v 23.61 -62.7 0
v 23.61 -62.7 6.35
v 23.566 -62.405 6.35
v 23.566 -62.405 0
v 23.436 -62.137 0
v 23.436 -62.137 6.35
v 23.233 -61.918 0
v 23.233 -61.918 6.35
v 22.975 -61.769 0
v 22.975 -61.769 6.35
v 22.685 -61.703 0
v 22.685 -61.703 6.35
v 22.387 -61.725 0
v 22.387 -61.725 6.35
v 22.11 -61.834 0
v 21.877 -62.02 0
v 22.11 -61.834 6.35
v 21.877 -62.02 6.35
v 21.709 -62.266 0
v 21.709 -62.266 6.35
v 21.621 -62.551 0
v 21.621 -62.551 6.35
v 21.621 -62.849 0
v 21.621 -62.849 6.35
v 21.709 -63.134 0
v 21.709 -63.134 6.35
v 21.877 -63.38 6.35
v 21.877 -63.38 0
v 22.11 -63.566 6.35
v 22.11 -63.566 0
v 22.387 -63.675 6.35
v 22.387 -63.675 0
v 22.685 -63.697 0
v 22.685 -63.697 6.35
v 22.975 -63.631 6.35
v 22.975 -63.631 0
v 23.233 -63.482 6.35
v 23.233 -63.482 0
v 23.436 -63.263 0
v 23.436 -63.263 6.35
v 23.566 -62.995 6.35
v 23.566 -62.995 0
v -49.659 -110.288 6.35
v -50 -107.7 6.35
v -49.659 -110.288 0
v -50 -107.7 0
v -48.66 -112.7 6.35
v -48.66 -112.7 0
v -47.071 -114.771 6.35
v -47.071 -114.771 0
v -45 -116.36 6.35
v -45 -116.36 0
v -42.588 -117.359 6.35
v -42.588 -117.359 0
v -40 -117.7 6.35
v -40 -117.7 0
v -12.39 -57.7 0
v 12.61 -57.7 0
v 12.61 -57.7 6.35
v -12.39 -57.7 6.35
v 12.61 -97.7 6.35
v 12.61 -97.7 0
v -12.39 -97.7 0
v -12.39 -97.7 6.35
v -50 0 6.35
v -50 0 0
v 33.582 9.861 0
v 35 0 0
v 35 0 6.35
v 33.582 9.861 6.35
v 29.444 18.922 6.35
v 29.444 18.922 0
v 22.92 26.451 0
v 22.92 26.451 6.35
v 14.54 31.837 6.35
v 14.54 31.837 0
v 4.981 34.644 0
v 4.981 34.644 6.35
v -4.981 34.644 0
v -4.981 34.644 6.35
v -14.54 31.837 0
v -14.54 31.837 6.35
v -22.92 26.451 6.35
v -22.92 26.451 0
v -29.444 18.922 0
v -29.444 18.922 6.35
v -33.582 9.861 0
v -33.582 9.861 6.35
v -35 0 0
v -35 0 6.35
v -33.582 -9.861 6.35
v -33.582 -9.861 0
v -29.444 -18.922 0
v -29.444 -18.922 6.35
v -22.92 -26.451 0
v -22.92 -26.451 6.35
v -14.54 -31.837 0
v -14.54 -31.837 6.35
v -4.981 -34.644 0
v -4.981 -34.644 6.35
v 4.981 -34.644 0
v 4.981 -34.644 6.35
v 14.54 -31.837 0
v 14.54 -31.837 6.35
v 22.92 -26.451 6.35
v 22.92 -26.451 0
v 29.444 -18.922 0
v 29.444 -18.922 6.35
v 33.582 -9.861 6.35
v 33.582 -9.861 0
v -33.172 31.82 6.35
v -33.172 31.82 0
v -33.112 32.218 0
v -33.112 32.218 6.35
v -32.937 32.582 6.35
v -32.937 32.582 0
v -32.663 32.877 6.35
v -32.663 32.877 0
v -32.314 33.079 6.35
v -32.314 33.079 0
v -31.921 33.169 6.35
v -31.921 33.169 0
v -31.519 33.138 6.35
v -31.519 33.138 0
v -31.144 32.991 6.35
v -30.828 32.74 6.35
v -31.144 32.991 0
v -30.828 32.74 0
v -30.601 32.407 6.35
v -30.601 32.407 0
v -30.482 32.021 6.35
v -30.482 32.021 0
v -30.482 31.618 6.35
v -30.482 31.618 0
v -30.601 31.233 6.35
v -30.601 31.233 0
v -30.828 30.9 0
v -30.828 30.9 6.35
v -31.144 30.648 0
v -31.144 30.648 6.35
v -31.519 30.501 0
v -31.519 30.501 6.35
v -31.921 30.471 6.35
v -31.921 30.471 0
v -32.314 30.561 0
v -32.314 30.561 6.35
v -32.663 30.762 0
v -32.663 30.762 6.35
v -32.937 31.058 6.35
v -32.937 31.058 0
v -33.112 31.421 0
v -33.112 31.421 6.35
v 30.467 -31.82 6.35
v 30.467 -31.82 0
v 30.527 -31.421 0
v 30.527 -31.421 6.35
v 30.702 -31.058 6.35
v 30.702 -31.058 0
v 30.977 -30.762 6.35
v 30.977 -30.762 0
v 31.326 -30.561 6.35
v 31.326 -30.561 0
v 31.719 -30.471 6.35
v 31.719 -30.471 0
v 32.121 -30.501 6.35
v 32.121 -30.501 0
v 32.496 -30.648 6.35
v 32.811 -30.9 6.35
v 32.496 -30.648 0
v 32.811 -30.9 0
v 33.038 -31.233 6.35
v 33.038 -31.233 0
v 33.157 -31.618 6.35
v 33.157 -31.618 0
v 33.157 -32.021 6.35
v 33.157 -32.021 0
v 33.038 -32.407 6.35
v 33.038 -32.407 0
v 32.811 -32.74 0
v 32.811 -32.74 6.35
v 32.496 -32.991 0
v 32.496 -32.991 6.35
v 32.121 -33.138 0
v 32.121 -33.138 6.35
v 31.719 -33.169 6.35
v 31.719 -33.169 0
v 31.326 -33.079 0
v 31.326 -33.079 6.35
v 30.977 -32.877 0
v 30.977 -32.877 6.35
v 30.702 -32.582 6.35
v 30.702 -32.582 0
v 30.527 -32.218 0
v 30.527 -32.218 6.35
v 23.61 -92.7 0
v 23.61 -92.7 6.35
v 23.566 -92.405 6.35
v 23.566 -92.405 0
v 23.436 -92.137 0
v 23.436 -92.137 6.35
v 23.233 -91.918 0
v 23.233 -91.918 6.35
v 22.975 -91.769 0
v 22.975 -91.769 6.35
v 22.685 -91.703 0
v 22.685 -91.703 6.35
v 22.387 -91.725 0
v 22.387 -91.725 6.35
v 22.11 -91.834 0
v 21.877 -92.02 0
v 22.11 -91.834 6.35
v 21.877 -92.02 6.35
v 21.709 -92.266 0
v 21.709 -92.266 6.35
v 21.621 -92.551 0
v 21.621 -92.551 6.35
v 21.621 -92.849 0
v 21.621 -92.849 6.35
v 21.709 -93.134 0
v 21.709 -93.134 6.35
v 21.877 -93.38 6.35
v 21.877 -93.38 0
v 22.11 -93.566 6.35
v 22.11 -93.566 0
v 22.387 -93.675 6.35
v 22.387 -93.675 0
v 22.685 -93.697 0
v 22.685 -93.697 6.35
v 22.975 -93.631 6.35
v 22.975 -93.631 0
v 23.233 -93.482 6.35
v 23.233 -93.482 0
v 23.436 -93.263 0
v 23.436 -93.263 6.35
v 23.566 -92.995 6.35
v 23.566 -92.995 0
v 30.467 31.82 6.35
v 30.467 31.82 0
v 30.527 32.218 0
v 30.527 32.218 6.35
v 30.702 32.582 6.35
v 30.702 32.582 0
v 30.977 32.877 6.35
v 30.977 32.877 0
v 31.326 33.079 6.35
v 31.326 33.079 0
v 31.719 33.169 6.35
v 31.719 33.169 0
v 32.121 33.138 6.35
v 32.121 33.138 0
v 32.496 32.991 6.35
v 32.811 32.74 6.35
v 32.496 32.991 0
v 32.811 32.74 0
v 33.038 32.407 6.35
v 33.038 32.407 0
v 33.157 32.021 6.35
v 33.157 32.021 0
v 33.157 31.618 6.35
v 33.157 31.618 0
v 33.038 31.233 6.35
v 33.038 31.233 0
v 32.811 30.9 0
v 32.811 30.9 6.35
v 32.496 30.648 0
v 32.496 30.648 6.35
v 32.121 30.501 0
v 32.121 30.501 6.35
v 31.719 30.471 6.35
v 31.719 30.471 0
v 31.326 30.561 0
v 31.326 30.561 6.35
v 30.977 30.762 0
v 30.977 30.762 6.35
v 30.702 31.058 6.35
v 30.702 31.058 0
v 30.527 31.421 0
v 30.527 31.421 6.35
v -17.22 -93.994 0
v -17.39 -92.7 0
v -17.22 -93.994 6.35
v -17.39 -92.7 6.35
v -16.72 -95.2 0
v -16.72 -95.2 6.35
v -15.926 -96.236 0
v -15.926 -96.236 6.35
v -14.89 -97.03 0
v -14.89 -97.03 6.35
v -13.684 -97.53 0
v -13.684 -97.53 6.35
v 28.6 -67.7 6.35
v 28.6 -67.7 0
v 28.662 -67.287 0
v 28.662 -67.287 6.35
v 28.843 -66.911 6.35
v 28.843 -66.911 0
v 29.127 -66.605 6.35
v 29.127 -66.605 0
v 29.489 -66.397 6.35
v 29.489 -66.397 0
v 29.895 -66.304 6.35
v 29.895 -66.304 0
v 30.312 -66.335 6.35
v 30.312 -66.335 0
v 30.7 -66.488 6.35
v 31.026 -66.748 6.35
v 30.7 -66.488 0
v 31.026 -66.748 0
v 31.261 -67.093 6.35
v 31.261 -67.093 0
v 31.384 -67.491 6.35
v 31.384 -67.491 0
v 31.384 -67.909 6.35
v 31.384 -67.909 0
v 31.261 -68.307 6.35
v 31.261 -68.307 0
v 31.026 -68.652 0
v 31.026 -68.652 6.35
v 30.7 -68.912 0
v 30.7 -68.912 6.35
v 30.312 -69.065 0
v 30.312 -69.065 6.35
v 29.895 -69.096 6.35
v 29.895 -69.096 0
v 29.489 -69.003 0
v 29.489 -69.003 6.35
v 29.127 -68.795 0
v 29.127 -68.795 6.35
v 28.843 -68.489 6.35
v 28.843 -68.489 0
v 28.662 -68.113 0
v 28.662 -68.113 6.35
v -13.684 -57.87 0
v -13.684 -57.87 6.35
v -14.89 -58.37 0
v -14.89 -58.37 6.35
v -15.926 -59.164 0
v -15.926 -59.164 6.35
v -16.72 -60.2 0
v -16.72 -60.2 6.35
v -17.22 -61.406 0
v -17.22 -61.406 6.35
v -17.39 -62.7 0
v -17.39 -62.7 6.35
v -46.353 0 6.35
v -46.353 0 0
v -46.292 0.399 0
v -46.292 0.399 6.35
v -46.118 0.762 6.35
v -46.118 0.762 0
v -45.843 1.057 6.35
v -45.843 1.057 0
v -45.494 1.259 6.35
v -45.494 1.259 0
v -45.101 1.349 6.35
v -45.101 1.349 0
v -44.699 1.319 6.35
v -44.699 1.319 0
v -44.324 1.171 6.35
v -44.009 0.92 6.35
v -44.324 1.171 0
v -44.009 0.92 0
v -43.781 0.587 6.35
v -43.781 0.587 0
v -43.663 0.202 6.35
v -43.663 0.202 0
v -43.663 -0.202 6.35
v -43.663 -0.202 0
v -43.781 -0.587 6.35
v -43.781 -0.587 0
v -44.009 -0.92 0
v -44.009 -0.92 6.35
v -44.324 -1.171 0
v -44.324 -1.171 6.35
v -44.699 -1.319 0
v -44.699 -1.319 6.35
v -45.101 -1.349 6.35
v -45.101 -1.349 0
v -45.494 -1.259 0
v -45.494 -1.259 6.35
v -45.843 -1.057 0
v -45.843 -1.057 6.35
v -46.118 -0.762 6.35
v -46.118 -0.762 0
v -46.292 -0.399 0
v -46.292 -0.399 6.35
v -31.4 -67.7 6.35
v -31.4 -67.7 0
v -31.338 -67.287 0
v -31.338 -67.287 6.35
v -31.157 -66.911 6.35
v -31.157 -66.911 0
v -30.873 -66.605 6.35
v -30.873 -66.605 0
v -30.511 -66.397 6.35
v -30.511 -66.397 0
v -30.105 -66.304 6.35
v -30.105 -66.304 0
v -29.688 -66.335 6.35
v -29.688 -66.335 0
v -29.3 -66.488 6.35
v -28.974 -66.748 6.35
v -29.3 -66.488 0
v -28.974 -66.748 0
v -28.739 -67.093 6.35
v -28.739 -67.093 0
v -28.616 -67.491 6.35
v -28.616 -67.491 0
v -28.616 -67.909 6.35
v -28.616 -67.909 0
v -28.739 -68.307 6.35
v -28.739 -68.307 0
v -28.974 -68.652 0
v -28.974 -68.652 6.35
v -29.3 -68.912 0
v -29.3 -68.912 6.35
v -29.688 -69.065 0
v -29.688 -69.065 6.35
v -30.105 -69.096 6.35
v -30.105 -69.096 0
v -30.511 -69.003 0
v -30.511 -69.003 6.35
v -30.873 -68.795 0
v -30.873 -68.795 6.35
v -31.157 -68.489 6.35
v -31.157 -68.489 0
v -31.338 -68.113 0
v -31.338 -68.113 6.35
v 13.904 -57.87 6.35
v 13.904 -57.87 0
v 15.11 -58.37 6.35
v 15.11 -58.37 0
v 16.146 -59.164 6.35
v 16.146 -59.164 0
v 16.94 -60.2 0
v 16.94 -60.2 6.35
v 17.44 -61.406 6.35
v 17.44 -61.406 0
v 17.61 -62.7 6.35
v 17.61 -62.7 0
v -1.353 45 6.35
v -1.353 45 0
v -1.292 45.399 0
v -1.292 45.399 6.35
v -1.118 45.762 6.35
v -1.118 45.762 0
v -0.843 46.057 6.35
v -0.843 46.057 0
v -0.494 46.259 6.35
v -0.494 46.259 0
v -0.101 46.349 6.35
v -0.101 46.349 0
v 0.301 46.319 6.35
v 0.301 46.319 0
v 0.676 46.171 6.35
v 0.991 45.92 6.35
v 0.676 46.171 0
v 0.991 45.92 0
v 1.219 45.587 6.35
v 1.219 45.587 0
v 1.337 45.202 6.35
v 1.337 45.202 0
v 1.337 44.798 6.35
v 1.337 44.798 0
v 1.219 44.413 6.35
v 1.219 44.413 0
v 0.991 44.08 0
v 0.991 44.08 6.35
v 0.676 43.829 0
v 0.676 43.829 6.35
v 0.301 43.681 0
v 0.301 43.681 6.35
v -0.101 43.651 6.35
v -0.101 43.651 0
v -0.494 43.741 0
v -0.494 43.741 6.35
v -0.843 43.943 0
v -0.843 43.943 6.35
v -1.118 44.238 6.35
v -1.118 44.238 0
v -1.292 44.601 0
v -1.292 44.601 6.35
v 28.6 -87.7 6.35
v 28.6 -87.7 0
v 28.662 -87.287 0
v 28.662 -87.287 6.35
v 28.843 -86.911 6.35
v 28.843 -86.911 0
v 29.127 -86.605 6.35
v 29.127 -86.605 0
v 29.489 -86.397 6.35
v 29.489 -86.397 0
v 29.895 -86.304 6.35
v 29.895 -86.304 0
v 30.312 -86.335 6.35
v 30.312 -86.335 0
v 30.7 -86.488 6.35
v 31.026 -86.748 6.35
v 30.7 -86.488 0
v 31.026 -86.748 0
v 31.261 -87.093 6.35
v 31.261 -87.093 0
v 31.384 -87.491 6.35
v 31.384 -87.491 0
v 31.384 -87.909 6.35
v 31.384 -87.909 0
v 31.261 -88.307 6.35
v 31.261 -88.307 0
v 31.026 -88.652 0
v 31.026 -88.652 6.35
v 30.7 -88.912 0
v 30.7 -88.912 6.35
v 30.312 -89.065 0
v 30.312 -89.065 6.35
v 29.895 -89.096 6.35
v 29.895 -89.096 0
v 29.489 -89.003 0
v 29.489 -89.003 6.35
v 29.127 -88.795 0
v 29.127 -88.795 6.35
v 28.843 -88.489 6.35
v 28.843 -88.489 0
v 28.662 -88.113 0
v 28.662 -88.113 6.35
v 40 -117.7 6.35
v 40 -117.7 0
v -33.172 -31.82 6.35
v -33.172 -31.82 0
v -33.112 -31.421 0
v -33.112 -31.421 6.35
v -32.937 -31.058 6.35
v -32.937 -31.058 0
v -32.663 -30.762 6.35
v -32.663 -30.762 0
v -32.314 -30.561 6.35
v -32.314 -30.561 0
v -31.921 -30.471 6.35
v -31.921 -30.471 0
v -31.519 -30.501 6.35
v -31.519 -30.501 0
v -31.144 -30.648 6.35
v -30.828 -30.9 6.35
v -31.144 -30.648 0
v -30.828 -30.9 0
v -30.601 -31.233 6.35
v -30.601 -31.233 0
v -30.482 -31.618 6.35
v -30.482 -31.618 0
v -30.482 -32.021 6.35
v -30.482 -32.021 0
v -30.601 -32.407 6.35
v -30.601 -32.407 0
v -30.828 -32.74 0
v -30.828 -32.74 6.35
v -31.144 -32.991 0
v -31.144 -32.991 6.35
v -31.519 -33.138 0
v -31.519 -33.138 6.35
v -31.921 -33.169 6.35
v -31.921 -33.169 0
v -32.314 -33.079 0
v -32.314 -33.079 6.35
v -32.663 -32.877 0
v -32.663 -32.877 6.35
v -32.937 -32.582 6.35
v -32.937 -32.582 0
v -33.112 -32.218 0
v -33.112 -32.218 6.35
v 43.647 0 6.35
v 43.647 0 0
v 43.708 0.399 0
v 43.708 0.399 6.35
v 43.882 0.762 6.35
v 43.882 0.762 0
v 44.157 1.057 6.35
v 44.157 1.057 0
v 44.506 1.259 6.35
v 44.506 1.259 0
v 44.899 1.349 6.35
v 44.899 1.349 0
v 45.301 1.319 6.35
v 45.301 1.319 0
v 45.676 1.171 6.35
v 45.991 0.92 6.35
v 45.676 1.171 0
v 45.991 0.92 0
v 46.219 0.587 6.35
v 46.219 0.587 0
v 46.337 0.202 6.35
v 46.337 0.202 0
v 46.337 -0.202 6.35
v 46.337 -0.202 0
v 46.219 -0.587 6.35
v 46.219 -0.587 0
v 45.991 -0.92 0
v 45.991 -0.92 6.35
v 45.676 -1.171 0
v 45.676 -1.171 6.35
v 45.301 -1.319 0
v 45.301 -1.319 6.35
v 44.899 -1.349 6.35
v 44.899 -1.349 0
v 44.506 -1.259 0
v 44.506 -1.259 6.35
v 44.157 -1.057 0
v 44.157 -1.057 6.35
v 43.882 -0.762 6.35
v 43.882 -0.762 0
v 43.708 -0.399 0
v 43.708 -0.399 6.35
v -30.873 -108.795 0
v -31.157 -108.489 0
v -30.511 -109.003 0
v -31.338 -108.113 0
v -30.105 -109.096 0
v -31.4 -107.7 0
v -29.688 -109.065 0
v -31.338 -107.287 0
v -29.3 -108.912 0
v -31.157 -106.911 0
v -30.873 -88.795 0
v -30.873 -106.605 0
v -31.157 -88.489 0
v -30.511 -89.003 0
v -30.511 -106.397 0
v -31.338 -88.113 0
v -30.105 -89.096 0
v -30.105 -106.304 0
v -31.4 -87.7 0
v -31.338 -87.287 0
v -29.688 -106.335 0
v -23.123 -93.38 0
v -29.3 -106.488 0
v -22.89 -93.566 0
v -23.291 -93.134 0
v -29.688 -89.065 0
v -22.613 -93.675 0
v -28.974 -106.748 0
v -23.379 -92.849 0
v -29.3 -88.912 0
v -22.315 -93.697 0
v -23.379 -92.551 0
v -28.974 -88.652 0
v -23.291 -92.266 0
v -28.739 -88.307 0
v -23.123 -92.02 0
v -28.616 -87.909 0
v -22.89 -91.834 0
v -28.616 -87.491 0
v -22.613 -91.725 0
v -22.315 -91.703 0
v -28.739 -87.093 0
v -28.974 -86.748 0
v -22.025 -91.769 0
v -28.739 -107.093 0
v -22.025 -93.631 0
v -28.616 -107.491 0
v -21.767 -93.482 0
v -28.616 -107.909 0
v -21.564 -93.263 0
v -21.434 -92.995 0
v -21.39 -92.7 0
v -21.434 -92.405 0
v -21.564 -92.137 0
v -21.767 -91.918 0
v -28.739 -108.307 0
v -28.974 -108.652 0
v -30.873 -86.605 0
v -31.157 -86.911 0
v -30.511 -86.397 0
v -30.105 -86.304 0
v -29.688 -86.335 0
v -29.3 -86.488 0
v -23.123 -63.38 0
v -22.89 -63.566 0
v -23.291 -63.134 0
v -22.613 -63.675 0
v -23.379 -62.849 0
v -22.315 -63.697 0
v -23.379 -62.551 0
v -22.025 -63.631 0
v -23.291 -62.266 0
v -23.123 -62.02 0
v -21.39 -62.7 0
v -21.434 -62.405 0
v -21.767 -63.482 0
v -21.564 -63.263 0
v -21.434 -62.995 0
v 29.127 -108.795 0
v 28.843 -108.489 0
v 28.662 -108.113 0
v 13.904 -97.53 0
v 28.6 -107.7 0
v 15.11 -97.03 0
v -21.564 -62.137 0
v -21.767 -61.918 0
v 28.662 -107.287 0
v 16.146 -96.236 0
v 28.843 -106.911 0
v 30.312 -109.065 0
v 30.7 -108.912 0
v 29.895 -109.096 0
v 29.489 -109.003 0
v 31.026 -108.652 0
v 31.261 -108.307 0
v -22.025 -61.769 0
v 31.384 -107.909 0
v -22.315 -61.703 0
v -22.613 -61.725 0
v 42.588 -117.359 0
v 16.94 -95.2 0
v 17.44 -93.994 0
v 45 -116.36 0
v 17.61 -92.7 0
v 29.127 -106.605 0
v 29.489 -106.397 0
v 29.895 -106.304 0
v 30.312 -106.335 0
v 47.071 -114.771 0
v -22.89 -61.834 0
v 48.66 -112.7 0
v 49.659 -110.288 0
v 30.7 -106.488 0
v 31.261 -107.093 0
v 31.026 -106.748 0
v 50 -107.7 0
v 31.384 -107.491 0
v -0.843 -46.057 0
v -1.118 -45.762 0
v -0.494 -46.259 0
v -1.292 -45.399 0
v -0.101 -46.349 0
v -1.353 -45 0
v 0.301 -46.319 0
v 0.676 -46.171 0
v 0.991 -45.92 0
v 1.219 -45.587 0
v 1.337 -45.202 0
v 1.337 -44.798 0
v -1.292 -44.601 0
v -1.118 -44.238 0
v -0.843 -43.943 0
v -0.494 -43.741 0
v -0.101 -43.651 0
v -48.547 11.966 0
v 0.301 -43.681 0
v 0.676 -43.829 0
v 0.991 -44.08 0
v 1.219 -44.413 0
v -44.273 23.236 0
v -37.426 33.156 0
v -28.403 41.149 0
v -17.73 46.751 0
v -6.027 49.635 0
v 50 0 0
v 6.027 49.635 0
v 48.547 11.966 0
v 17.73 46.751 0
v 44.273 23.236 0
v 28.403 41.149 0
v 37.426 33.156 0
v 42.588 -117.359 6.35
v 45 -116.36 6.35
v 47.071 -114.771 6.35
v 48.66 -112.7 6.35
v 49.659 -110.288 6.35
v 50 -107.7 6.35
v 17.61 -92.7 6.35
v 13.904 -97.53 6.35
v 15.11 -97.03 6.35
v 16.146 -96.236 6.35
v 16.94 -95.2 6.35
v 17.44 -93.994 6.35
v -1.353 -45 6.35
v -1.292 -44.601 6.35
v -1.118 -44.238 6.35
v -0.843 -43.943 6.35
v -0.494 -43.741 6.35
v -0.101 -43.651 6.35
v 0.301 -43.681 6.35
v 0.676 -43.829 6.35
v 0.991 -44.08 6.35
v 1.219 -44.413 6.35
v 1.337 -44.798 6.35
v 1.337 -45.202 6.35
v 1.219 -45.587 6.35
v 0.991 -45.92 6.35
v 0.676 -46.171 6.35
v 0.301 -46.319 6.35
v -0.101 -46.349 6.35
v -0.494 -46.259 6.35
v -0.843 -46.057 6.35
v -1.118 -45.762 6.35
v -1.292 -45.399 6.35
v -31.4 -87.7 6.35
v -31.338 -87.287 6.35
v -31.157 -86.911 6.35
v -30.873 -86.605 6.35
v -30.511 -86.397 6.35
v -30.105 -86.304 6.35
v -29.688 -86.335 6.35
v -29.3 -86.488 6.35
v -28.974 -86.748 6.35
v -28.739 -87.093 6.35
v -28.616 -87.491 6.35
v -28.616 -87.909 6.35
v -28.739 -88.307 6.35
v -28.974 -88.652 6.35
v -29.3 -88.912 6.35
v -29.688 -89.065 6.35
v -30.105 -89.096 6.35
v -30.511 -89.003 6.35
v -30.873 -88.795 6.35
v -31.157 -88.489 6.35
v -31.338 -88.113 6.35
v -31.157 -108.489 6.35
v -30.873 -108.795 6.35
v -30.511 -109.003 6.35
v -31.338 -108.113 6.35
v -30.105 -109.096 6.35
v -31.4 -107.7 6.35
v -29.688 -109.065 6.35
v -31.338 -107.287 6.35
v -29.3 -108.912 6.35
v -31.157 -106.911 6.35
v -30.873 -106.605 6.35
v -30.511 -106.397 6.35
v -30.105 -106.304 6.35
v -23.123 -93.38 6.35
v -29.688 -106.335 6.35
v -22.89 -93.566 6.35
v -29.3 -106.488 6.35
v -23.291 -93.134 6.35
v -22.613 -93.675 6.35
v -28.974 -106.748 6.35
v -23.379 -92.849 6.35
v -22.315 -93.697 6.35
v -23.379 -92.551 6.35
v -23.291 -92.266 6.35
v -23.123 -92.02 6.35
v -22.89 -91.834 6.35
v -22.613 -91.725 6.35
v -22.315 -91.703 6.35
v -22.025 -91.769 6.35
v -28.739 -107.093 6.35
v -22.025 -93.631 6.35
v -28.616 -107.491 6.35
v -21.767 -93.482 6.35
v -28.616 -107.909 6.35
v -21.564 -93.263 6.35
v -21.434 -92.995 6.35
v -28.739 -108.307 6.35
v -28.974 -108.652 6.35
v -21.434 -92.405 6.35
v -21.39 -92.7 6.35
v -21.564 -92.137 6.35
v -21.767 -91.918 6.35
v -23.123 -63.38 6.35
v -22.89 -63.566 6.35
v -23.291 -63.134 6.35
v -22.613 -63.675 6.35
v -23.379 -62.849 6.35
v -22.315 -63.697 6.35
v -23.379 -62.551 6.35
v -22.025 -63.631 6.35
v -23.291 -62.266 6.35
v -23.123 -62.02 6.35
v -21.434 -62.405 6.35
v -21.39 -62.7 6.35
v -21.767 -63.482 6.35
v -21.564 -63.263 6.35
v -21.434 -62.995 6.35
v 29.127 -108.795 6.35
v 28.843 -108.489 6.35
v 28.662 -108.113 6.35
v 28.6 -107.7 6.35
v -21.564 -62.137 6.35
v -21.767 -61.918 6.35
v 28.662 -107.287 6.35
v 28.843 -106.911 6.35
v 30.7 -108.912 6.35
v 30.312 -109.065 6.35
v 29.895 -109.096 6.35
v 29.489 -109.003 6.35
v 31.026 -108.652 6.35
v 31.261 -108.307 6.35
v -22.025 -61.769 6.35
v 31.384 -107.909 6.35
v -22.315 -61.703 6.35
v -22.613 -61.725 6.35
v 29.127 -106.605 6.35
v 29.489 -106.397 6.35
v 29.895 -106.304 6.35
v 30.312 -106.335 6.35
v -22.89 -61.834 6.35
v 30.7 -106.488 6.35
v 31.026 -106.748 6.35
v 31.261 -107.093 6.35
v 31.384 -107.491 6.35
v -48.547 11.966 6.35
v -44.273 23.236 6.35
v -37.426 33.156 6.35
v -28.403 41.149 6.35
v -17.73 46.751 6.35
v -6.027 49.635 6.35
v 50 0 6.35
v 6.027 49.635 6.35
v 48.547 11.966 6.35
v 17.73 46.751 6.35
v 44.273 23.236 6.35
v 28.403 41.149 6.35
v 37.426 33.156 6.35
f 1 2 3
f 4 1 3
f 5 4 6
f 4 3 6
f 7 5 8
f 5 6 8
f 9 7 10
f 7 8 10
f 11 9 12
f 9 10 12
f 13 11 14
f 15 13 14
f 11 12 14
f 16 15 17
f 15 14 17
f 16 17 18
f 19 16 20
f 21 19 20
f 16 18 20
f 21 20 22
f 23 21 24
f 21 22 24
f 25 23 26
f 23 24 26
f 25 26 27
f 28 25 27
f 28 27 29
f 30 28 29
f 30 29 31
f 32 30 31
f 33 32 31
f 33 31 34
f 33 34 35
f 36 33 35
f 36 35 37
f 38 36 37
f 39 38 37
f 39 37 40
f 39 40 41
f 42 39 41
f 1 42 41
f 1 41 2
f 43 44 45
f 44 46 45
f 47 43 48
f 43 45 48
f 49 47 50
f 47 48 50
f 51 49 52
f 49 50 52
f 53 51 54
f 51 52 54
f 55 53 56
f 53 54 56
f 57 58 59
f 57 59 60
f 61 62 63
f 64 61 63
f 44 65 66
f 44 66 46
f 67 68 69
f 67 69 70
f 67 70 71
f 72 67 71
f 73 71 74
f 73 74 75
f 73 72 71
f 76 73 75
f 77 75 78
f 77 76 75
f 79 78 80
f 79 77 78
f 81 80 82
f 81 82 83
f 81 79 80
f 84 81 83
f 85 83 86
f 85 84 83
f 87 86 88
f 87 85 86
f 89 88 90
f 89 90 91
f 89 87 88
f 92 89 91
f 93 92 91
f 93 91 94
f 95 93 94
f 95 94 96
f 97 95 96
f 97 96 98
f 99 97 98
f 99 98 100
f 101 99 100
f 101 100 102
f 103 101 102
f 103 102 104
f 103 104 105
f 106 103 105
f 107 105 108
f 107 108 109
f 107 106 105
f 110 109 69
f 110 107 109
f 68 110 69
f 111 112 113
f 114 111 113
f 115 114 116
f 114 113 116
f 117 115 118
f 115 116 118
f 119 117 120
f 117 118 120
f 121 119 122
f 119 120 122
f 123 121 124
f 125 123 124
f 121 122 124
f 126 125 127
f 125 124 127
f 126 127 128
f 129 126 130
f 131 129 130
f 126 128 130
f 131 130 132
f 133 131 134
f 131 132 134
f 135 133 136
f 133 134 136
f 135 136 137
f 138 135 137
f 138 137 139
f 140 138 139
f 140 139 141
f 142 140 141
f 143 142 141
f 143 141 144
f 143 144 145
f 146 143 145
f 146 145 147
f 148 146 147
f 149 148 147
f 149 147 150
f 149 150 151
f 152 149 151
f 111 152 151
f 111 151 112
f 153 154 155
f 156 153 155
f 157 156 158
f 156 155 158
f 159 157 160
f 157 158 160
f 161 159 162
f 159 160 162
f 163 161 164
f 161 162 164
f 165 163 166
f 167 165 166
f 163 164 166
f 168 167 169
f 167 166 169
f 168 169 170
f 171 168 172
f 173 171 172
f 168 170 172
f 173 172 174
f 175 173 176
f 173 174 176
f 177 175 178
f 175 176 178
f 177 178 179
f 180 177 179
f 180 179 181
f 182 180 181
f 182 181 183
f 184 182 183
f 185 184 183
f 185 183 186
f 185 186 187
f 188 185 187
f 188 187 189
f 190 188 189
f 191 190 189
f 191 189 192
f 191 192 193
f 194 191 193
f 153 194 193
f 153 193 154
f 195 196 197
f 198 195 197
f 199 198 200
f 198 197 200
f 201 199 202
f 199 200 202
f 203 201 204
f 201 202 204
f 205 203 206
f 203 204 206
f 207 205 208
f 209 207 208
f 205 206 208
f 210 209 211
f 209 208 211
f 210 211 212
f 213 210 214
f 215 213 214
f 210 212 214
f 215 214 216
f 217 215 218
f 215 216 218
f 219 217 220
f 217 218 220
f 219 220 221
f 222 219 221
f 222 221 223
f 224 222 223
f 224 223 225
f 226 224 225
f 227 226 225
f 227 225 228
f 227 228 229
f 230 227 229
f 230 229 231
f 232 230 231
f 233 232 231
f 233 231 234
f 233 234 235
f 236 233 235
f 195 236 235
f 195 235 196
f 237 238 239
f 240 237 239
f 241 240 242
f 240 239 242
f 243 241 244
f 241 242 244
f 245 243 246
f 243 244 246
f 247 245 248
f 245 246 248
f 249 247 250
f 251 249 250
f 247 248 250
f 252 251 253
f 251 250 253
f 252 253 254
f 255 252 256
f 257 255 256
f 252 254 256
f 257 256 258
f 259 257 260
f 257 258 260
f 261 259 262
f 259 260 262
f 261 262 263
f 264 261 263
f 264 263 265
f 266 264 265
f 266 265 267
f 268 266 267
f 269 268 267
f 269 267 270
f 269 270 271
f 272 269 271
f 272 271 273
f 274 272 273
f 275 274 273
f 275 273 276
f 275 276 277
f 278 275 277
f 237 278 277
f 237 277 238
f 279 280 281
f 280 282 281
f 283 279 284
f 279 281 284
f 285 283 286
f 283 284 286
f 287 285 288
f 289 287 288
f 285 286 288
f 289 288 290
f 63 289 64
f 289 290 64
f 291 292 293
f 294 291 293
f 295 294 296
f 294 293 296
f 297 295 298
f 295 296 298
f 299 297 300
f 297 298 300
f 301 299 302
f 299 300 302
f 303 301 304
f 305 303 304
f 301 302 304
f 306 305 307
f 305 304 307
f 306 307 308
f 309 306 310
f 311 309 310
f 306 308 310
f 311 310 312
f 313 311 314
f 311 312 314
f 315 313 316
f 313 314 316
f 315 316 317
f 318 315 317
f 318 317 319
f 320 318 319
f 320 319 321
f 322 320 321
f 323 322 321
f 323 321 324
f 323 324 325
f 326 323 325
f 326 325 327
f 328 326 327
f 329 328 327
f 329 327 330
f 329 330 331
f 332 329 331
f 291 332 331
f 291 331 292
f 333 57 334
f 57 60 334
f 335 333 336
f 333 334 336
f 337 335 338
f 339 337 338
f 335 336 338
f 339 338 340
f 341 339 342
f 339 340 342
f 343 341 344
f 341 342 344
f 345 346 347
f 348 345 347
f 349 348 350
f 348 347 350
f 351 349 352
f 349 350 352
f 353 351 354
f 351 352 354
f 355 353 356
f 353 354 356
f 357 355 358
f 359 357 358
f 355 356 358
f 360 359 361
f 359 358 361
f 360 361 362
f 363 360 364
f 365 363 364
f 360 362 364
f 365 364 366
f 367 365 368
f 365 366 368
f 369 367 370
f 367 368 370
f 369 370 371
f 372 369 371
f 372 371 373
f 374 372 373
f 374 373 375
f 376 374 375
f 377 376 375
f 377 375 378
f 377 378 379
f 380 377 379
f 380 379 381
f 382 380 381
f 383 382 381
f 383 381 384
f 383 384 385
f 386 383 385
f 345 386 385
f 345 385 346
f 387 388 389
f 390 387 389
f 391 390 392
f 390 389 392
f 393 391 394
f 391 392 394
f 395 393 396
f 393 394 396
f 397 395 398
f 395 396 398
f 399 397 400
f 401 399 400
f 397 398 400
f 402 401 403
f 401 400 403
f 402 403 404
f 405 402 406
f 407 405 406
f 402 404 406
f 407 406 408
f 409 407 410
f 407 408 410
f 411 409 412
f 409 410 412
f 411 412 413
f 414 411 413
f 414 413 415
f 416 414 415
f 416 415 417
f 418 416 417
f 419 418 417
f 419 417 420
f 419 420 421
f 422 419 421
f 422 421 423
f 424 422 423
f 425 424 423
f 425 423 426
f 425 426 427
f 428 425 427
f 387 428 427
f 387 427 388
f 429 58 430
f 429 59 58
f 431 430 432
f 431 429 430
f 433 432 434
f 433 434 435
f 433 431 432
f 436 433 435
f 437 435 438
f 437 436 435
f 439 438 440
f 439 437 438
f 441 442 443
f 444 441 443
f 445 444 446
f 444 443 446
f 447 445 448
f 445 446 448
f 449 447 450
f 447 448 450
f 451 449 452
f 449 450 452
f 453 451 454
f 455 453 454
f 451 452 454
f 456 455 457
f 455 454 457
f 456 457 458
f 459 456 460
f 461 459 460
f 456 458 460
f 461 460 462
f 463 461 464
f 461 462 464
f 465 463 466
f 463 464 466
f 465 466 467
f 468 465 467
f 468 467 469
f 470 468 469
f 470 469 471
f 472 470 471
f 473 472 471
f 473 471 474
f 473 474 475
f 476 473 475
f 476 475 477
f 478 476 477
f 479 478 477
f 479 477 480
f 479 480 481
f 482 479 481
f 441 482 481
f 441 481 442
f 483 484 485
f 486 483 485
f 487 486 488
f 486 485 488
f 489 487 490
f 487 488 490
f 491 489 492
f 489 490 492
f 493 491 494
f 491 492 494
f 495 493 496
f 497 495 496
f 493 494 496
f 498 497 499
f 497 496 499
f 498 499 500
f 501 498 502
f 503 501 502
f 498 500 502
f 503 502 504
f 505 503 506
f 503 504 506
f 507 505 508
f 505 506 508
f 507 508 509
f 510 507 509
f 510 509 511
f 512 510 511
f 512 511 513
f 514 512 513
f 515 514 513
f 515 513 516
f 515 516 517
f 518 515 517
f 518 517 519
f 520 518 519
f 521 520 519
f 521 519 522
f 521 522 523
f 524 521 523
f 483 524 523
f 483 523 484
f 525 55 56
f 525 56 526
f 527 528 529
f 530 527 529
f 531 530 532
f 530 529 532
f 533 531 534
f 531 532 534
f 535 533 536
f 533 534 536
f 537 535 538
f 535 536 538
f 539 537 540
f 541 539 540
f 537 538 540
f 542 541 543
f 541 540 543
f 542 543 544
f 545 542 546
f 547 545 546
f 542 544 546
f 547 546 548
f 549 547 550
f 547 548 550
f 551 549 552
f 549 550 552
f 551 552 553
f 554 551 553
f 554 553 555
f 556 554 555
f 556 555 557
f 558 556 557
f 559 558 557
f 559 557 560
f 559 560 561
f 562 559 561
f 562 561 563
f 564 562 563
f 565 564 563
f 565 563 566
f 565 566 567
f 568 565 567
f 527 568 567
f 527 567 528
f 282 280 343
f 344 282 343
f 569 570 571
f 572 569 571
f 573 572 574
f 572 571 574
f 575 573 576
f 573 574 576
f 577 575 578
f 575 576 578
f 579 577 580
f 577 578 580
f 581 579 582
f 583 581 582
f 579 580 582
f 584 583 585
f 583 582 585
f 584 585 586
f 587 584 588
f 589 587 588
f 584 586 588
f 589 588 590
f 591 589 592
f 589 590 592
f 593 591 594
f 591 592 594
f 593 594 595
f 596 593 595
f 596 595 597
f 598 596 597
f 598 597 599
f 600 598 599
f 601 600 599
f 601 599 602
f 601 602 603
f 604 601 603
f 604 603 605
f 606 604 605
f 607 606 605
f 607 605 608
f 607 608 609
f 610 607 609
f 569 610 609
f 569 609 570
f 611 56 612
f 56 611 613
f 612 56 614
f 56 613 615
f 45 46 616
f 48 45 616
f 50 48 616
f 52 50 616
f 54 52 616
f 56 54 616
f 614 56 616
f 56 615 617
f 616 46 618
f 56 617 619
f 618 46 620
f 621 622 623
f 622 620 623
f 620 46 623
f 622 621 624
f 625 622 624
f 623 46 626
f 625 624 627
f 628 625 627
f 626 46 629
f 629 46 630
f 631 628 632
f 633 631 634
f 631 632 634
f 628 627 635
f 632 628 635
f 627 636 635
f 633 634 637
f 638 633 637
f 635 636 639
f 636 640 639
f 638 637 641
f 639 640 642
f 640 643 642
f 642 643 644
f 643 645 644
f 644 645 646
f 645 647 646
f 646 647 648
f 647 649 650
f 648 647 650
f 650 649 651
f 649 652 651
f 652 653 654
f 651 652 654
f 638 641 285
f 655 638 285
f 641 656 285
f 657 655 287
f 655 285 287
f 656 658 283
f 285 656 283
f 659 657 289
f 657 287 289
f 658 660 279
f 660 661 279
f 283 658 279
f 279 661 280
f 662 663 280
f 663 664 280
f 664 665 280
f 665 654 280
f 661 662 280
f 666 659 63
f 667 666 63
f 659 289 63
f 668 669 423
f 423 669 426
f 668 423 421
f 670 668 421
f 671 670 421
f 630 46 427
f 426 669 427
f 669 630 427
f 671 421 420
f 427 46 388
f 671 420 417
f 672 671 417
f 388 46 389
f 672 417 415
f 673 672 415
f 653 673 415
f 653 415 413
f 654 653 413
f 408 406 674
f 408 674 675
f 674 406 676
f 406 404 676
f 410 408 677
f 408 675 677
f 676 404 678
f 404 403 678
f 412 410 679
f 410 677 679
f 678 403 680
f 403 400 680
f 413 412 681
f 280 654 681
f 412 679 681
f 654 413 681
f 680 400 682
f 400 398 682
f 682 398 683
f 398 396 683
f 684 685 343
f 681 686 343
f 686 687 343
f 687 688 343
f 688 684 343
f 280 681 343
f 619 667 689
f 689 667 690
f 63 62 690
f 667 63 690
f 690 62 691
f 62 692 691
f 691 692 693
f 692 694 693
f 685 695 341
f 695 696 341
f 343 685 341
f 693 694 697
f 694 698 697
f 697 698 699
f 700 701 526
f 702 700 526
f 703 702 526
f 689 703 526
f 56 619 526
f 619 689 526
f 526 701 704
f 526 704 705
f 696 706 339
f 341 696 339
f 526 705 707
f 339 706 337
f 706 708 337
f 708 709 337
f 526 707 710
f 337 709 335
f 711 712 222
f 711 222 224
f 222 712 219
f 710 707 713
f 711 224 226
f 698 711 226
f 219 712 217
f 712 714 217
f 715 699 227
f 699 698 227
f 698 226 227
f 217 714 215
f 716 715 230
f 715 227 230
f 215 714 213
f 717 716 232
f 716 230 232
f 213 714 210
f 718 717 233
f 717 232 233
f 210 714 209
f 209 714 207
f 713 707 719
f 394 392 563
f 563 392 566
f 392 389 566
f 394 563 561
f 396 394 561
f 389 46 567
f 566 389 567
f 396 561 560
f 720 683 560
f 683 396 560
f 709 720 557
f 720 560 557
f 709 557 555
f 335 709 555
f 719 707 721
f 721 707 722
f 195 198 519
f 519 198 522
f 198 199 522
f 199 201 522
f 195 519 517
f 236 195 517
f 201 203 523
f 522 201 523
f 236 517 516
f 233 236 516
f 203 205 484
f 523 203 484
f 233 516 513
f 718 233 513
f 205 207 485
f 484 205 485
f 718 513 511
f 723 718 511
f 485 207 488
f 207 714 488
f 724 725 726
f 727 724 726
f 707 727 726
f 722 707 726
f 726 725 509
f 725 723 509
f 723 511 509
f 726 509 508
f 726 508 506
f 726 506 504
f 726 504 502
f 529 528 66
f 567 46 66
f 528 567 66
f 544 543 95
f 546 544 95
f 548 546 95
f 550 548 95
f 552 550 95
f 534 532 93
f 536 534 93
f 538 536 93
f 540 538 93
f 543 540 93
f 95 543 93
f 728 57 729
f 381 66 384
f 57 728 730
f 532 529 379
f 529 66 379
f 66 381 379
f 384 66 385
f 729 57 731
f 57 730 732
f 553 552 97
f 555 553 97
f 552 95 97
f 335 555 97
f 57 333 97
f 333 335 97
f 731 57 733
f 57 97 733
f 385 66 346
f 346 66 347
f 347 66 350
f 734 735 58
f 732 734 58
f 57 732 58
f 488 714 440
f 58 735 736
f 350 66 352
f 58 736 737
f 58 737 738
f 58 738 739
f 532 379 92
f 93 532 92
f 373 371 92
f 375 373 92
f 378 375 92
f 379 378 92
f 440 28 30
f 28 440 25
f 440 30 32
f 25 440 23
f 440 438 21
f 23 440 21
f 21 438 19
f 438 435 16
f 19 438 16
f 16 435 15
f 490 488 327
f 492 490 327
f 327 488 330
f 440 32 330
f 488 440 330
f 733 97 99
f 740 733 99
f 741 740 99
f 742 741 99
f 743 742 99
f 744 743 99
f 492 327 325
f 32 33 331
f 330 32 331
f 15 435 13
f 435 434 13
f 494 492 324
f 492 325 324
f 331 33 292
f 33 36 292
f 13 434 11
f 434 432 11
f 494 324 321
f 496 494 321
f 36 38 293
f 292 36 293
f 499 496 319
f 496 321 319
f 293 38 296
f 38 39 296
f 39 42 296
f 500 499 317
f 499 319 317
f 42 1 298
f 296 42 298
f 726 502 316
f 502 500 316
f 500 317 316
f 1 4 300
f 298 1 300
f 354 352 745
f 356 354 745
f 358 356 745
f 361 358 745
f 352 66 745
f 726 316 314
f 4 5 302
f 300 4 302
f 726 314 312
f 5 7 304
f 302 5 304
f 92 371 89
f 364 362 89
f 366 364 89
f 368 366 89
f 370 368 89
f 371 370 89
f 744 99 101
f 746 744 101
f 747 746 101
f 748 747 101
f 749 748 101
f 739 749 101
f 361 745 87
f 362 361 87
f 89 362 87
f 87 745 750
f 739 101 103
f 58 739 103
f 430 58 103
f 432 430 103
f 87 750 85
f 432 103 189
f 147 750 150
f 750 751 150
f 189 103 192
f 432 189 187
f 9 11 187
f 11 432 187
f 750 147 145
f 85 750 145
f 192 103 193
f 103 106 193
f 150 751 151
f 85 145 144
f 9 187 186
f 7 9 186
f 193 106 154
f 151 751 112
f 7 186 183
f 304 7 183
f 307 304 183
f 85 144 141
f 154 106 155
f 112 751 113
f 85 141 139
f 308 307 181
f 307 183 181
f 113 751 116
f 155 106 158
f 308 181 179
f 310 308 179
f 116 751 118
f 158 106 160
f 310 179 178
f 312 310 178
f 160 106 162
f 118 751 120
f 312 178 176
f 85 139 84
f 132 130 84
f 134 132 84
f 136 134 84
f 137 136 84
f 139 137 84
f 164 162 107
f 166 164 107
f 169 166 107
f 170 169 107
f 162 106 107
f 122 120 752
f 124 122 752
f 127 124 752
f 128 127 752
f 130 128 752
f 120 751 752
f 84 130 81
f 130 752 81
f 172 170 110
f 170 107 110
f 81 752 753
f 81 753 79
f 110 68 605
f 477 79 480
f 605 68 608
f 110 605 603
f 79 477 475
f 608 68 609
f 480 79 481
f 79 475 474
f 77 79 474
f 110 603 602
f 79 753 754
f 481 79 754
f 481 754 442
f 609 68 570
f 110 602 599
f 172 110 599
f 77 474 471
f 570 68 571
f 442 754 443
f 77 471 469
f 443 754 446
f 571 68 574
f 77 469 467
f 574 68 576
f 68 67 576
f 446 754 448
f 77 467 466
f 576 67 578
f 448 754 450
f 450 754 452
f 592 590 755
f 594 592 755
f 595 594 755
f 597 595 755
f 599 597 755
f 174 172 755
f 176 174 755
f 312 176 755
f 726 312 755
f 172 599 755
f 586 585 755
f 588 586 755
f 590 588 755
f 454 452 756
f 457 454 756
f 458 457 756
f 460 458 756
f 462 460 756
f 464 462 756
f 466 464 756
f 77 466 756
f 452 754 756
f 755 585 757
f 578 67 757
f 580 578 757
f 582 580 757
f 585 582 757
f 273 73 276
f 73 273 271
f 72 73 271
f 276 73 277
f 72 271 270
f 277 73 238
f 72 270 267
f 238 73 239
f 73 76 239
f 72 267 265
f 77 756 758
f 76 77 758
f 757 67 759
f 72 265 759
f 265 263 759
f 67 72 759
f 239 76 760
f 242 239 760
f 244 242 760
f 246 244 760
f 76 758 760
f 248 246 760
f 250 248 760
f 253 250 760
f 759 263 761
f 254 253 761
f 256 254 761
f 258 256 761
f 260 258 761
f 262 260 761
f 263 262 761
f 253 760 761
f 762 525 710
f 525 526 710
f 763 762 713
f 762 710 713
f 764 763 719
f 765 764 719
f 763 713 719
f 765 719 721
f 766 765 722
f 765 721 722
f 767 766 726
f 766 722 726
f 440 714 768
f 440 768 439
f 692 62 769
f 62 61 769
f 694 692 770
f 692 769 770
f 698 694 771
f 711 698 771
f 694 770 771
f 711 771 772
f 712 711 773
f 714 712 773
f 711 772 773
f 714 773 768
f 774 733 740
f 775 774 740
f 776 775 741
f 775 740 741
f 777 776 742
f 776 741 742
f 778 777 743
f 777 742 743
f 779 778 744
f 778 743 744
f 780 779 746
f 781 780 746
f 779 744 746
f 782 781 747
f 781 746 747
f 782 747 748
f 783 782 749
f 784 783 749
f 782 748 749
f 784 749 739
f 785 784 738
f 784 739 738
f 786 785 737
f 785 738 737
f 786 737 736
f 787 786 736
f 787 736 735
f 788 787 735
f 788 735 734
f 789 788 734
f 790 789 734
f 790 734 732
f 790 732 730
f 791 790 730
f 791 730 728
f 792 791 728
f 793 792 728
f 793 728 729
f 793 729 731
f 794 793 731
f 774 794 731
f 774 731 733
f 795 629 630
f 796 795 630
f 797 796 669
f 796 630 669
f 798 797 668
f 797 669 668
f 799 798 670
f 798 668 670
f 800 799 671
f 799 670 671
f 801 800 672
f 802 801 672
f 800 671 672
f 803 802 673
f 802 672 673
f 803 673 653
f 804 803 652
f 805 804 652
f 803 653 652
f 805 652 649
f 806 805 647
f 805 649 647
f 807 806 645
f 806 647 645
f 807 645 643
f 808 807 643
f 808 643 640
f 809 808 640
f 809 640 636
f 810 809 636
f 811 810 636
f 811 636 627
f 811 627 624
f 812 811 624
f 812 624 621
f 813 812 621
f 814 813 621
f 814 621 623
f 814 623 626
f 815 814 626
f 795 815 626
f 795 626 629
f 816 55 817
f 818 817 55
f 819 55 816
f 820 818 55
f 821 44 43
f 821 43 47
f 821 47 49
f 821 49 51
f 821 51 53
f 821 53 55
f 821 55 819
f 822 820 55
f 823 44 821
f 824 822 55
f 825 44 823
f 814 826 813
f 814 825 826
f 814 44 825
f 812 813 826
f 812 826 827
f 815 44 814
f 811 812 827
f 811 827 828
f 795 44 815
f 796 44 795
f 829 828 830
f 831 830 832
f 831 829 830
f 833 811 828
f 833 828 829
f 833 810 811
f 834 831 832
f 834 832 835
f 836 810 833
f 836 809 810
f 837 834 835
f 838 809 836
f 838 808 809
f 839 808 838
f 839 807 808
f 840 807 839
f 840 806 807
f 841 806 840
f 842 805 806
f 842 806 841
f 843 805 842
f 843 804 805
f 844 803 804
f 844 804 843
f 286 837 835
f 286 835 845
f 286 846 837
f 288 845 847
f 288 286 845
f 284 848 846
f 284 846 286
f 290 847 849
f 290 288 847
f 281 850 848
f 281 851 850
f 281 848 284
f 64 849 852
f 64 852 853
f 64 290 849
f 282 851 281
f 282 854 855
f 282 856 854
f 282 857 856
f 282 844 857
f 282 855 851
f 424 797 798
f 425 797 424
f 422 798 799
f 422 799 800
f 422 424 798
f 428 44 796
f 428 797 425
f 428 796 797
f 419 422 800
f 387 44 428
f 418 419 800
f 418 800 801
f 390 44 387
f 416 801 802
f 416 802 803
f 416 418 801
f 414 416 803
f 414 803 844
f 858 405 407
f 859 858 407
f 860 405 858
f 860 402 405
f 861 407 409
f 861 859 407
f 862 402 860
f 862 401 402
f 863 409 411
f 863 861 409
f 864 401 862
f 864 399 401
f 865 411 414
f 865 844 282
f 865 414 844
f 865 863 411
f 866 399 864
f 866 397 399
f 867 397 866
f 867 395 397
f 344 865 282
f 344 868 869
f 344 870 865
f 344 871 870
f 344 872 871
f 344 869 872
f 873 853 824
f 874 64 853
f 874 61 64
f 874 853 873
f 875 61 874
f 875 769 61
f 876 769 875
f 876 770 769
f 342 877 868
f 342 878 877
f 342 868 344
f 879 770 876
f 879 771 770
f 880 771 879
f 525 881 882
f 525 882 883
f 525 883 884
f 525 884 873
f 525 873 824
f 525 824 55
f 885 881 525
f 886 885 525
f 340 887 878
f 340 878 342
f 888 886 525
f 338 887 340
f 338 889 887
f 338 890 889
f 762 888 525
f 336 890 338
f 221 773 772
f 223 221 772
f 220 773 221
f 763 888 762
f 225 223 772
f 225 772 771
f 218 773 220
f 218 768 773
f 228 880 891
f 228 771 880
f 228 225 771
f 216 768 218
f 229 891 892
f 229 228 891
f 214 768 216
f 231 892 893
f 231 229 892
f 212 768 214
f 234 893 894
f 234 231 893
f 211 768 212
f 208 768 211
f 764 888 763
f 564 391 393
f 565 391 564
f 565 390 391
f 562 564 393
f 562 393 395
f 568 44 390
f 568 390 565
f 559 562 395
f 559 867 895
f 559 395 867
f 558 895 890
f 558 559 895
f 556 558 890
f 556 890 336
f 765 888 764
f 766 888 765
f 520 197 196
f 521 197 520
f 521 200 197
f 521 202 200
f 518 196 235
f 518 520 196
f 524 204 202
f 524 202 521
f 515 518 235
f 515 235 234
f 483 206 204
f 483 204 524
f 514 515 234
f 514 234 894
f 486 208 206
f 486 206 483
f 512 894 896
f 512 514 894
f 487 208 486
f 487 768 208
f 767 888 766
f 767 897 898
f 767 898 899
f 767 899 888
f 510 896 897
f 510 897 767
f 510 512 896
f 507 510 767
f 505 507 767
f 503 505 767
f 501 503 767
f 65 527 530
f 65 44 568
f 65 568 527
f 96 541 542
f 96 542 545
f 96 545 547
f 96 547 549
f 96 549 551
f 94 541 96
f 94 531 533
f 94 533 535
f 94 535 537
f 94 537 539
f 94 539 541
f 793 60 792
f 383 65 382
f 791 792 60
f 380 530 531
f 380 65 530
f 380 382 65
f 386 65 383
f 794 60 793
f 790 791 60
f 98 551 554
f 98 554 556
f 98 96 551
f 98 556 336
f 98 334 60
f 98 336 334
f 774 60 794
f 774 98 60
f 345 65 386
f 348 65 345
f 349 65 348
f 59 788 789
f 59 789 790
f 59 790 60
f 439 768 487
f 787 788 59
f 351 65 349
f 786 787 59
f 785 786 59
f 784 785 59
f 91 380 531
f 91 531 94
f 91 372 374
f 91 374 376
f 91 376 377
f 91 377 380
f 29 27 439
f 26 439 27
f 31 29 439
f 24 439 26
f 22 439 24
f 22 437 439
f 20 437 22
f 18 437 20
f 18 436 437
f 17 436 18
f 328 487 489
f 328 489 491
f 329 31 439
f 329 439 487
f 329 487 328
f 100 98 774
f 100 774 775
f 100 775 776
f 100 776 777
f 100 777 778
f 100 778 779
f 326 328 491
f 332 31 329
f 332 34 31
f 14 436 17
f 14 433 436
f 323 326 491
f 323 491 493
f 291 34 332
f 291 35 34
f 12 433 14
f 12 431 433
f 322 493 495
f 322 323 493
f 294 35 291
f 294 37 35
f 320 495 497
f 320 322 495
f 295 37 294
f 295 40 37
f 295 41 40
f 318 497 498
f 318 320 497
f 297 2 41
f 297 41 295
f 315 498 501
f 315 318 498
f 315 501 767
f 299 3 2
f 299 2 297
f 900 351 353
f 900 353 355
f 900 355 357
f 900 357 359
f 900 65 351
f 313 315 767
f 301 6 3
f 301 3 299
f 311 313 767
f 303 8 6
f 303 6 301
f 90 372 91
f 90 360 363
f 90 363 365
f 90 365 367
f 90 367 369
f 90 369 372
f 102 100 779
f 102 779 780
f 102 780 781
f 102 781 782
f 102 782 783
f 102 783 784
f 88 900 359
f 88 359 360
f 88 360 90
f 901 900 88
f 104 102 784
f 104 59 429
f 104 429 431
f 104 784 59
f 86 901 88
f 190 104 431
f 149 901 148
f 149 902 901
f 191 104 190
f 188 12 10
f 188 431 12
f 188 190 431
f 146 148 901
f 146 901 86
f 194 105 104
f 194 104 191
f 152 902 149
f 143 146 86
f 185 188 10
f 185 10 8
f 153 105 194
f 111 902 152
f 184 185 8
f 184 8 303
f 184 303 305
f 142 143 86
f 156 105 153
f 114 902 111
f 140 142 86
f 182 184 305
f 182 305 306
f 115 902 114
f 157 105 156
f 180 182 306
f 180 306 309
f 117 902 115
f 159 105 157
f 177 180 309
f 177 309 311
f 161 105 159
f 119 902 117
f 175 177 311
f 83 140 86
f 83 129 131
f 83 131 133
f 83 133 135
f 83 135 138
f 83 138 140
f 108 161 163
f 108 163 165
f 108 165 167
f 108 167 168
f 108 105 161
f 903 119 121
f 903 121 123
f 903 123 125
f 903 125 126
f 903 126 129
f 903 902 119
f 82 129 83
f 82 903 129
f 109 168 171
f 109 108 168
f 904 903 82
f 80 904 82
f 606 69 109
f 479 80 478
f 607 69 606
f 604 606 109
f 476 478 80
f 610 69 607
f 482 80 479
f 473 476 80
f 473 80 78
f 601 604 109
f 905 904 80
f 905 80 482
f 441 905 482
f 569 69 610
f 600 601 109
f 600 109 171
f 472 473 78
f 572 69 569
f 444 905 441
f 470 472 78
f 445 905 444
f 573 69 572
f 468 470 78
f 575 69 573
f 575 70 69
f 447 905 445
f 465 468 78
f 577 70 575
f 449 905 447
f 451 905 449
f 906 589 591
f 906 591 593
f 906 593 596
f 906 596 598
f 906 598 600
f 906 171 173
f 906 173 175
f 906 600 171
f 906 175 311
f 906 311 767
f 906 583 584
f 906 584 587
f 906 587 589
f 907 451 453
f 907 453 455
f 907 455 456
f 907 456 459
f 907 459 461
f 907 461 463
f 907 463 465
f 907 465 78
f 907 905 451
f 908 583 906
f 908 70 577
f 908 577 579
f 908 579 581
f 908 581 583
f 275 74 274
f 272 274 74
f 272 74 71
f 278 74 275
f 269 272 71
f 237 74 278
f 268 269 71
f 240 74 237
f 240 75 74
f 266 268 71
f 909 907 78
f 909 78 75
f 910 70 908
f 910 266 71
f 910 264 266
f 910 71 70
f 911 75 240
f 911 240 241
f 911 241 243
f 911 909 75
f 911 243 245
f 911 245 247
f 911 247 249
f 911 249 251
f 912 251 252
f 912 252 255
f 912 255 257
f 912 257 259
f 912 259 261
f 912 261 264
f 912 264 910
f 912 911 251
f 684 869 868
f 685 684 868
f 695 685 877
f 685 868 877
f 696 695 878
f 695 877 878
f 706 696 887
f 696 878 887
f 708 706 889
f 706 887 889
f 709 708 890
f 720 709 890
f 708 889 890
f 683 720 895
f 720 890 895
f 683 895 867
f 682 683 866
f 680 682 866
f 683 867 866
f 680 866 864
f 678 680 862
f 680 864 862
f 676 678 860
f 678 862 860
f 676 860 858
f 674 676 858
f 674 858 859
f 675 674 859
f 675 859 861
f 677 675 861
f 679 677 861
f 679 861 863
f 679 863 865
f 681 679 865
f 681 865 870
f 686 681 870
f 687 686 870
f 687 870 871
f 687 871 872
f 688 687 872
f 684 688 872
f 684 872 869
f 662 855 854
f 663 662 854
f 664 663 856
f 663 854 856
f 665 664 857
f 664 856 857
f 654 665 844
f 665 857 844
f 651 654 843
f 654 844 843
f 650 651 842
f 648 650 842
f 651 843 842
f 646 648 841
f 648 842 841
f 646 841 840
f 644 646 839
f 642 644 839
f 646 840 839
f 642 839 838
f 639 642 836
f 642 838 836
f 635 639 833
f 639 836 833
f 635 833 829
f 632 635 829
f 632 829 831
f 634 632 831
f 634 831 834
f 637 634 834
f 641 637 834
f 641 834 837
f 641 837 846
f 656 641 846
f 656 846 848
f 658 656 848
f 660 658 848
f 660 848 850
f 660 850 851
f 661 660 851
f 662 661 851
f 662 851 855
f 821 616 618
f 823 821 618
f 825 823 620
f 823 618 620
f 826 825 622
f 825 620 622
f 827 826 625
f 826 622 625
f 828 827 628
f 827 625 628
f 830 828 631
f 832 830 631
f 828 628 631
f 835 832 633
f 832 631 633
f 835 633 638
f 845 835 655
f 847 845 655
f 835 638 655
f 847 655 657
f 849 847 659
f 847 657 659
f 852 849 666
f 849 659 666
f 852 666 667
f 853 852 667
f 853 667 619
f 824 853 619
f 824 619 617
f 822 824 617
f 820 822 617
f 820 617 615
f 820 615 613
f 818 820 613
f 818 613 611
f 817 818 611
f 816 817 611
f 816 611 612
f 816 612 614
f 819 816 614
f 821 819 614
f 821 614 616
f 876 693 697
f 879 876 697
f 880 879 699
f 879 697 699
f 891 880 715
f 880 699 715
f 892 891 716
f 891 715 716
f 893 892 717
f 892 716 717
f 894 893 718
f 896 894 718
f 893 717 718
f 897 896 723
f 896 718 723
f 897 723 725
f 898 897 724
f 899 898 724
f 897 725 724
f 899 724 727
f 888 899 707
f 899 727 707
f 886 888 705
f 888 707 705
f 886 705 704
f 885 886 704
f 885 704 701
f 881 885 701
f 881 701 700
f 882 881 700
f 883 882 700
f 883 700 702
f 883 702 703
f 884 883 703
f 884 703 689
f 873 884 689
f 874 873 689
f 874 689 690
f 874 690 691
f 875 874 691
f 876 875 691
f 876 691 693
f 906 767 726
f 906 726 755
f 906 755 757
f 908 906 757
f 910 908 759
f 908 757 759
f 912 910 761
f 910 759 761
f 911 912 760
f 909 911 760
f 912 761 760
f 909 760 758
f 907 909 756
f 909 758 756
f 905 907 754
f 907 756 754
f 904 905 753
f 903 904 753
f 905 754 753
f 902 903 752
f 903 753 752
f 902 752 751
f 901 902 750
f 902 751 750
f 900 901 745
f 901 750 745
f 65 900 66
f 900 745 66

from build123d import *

# Parameters (mm, degrees)
SKETCH1_R             = 50
SKETCH1_R_2           = 35
BOSS_EXTRUDE1_DEPTH   = 6.35
BOSS_EXTRUDE2_DEPTH   = 6.35
F_6_32_TAPPED_HOLE1_D = 2.7051
FILLET1_R             = 10
M4X0_7_TAPPED_HOLE1_D = 2.8
SKETCH11_W            = 35
SKETCH11_H            = 40
CUT_EXTRUDE1_DEPTH    = 10
FILLET2_R             = 5
M3X0_5_TAPPED_HOLE1_D = 2


with BuildPart() as part:
    # Sketch1 → Boss-Extrude1 (new body)
    with BuildSketch(Plane.XY):
        Circle(SKETCH1_R)
        Circle(SKETCH1_R_2, mode=Mode.SUBTRACT)
    extrude(amount=BOSS_EXTRUDE1_DEPTH)

    # Sketch3 → Boss-Extrude2 (add)
    with BuildSketch(Plane.XY.offset(6.35)):
        with BuildLine():
            ThreePointArc((50, 0), (0, -50), (-50, 0))
            Line((-50, 0), (-50, -117.7))
            Line((-50, -117.7), (50, -117.7))
            Line((50, -117.7), (50, 0))
        make_face()
    extrude(amount=-BOSS_EXTRUDE2_DEPTH)

    # #6-32 Tapped Hole1 (through all)
    with Locations(Plane.XY.offset(6.35)):
        with Locations((-45, 0), (-31.819805153, -31.819805153), (0, -45), (31.819805153, -31.819805153), (45, 0), (31.819805153, 31.819805153), (0, 45), (-31.819805153, 31.819805153)):
            Hole(F_6_32_TAPPED_HOLE1_D / 2)

    # Fillet1
    fillet1_edges = [part.edges().sort_by_distance(p)[0] for p in [
        (-50, -117.7, 3.175),
        (50, -117.7, 3.175),
    ]]
    fillet(fillet1_edges, radius=FILLET1_R)

    # M4x0.7 Tapped Hole1 (through all)
    with Locations(Plane.XY.offset(6.35)):
        with Locations((-30, -107.7), (30, -107.7), (30, -87.7), (-30, -87.7), (30, -67.7), (-30, -67.7)):
            Hole(M4X0_7_TAPPED_HOLE1_D / 2)

    # Sketch11 → Cut-Extrude1 (cut)
    with BuildSketch(Plane(origin=(0, 0, 0), x_dir=(-1, 0, 0), z_dir=(0, 0, -1))):
        with Locations((-0.110004591, -77.7)):
            Rectangle(SKETCH11_W, SKETCH11_H)
    extrude(amount=-CUT_EXTRUDE1_DEPTH, mode=Mode.SUBTRACT)

    # Fillet2
    fillet2_edges = [part.edges().sort_by_distance(p)[0] for p in [
        (-17.389995409, -57.7, 3.175),
        (-17.389995409, -97.7, 3.175),
        (17.610004591, -97.7, 3.175),
        (17.610004591, -57.7, 3.175),
    ]]
    fillet(fillet2_edges, radius=FILLET2_R)

    # M3x0.5 Tapped Hole1 (through all)
    with Locations(Plane(origin=(0, 0, 0), x_dir=(-1, 0, 0), z_dir=(0, 0, -1))):
        with Locations((-22.610004591, -62.7), (-22.610004591, -92.7), (22.389995409, -92.7), (22.389995409, -62.7)):
            Hole(M3X0_5_TAPPED_HOLE1_D / 2)


solid = part.part
